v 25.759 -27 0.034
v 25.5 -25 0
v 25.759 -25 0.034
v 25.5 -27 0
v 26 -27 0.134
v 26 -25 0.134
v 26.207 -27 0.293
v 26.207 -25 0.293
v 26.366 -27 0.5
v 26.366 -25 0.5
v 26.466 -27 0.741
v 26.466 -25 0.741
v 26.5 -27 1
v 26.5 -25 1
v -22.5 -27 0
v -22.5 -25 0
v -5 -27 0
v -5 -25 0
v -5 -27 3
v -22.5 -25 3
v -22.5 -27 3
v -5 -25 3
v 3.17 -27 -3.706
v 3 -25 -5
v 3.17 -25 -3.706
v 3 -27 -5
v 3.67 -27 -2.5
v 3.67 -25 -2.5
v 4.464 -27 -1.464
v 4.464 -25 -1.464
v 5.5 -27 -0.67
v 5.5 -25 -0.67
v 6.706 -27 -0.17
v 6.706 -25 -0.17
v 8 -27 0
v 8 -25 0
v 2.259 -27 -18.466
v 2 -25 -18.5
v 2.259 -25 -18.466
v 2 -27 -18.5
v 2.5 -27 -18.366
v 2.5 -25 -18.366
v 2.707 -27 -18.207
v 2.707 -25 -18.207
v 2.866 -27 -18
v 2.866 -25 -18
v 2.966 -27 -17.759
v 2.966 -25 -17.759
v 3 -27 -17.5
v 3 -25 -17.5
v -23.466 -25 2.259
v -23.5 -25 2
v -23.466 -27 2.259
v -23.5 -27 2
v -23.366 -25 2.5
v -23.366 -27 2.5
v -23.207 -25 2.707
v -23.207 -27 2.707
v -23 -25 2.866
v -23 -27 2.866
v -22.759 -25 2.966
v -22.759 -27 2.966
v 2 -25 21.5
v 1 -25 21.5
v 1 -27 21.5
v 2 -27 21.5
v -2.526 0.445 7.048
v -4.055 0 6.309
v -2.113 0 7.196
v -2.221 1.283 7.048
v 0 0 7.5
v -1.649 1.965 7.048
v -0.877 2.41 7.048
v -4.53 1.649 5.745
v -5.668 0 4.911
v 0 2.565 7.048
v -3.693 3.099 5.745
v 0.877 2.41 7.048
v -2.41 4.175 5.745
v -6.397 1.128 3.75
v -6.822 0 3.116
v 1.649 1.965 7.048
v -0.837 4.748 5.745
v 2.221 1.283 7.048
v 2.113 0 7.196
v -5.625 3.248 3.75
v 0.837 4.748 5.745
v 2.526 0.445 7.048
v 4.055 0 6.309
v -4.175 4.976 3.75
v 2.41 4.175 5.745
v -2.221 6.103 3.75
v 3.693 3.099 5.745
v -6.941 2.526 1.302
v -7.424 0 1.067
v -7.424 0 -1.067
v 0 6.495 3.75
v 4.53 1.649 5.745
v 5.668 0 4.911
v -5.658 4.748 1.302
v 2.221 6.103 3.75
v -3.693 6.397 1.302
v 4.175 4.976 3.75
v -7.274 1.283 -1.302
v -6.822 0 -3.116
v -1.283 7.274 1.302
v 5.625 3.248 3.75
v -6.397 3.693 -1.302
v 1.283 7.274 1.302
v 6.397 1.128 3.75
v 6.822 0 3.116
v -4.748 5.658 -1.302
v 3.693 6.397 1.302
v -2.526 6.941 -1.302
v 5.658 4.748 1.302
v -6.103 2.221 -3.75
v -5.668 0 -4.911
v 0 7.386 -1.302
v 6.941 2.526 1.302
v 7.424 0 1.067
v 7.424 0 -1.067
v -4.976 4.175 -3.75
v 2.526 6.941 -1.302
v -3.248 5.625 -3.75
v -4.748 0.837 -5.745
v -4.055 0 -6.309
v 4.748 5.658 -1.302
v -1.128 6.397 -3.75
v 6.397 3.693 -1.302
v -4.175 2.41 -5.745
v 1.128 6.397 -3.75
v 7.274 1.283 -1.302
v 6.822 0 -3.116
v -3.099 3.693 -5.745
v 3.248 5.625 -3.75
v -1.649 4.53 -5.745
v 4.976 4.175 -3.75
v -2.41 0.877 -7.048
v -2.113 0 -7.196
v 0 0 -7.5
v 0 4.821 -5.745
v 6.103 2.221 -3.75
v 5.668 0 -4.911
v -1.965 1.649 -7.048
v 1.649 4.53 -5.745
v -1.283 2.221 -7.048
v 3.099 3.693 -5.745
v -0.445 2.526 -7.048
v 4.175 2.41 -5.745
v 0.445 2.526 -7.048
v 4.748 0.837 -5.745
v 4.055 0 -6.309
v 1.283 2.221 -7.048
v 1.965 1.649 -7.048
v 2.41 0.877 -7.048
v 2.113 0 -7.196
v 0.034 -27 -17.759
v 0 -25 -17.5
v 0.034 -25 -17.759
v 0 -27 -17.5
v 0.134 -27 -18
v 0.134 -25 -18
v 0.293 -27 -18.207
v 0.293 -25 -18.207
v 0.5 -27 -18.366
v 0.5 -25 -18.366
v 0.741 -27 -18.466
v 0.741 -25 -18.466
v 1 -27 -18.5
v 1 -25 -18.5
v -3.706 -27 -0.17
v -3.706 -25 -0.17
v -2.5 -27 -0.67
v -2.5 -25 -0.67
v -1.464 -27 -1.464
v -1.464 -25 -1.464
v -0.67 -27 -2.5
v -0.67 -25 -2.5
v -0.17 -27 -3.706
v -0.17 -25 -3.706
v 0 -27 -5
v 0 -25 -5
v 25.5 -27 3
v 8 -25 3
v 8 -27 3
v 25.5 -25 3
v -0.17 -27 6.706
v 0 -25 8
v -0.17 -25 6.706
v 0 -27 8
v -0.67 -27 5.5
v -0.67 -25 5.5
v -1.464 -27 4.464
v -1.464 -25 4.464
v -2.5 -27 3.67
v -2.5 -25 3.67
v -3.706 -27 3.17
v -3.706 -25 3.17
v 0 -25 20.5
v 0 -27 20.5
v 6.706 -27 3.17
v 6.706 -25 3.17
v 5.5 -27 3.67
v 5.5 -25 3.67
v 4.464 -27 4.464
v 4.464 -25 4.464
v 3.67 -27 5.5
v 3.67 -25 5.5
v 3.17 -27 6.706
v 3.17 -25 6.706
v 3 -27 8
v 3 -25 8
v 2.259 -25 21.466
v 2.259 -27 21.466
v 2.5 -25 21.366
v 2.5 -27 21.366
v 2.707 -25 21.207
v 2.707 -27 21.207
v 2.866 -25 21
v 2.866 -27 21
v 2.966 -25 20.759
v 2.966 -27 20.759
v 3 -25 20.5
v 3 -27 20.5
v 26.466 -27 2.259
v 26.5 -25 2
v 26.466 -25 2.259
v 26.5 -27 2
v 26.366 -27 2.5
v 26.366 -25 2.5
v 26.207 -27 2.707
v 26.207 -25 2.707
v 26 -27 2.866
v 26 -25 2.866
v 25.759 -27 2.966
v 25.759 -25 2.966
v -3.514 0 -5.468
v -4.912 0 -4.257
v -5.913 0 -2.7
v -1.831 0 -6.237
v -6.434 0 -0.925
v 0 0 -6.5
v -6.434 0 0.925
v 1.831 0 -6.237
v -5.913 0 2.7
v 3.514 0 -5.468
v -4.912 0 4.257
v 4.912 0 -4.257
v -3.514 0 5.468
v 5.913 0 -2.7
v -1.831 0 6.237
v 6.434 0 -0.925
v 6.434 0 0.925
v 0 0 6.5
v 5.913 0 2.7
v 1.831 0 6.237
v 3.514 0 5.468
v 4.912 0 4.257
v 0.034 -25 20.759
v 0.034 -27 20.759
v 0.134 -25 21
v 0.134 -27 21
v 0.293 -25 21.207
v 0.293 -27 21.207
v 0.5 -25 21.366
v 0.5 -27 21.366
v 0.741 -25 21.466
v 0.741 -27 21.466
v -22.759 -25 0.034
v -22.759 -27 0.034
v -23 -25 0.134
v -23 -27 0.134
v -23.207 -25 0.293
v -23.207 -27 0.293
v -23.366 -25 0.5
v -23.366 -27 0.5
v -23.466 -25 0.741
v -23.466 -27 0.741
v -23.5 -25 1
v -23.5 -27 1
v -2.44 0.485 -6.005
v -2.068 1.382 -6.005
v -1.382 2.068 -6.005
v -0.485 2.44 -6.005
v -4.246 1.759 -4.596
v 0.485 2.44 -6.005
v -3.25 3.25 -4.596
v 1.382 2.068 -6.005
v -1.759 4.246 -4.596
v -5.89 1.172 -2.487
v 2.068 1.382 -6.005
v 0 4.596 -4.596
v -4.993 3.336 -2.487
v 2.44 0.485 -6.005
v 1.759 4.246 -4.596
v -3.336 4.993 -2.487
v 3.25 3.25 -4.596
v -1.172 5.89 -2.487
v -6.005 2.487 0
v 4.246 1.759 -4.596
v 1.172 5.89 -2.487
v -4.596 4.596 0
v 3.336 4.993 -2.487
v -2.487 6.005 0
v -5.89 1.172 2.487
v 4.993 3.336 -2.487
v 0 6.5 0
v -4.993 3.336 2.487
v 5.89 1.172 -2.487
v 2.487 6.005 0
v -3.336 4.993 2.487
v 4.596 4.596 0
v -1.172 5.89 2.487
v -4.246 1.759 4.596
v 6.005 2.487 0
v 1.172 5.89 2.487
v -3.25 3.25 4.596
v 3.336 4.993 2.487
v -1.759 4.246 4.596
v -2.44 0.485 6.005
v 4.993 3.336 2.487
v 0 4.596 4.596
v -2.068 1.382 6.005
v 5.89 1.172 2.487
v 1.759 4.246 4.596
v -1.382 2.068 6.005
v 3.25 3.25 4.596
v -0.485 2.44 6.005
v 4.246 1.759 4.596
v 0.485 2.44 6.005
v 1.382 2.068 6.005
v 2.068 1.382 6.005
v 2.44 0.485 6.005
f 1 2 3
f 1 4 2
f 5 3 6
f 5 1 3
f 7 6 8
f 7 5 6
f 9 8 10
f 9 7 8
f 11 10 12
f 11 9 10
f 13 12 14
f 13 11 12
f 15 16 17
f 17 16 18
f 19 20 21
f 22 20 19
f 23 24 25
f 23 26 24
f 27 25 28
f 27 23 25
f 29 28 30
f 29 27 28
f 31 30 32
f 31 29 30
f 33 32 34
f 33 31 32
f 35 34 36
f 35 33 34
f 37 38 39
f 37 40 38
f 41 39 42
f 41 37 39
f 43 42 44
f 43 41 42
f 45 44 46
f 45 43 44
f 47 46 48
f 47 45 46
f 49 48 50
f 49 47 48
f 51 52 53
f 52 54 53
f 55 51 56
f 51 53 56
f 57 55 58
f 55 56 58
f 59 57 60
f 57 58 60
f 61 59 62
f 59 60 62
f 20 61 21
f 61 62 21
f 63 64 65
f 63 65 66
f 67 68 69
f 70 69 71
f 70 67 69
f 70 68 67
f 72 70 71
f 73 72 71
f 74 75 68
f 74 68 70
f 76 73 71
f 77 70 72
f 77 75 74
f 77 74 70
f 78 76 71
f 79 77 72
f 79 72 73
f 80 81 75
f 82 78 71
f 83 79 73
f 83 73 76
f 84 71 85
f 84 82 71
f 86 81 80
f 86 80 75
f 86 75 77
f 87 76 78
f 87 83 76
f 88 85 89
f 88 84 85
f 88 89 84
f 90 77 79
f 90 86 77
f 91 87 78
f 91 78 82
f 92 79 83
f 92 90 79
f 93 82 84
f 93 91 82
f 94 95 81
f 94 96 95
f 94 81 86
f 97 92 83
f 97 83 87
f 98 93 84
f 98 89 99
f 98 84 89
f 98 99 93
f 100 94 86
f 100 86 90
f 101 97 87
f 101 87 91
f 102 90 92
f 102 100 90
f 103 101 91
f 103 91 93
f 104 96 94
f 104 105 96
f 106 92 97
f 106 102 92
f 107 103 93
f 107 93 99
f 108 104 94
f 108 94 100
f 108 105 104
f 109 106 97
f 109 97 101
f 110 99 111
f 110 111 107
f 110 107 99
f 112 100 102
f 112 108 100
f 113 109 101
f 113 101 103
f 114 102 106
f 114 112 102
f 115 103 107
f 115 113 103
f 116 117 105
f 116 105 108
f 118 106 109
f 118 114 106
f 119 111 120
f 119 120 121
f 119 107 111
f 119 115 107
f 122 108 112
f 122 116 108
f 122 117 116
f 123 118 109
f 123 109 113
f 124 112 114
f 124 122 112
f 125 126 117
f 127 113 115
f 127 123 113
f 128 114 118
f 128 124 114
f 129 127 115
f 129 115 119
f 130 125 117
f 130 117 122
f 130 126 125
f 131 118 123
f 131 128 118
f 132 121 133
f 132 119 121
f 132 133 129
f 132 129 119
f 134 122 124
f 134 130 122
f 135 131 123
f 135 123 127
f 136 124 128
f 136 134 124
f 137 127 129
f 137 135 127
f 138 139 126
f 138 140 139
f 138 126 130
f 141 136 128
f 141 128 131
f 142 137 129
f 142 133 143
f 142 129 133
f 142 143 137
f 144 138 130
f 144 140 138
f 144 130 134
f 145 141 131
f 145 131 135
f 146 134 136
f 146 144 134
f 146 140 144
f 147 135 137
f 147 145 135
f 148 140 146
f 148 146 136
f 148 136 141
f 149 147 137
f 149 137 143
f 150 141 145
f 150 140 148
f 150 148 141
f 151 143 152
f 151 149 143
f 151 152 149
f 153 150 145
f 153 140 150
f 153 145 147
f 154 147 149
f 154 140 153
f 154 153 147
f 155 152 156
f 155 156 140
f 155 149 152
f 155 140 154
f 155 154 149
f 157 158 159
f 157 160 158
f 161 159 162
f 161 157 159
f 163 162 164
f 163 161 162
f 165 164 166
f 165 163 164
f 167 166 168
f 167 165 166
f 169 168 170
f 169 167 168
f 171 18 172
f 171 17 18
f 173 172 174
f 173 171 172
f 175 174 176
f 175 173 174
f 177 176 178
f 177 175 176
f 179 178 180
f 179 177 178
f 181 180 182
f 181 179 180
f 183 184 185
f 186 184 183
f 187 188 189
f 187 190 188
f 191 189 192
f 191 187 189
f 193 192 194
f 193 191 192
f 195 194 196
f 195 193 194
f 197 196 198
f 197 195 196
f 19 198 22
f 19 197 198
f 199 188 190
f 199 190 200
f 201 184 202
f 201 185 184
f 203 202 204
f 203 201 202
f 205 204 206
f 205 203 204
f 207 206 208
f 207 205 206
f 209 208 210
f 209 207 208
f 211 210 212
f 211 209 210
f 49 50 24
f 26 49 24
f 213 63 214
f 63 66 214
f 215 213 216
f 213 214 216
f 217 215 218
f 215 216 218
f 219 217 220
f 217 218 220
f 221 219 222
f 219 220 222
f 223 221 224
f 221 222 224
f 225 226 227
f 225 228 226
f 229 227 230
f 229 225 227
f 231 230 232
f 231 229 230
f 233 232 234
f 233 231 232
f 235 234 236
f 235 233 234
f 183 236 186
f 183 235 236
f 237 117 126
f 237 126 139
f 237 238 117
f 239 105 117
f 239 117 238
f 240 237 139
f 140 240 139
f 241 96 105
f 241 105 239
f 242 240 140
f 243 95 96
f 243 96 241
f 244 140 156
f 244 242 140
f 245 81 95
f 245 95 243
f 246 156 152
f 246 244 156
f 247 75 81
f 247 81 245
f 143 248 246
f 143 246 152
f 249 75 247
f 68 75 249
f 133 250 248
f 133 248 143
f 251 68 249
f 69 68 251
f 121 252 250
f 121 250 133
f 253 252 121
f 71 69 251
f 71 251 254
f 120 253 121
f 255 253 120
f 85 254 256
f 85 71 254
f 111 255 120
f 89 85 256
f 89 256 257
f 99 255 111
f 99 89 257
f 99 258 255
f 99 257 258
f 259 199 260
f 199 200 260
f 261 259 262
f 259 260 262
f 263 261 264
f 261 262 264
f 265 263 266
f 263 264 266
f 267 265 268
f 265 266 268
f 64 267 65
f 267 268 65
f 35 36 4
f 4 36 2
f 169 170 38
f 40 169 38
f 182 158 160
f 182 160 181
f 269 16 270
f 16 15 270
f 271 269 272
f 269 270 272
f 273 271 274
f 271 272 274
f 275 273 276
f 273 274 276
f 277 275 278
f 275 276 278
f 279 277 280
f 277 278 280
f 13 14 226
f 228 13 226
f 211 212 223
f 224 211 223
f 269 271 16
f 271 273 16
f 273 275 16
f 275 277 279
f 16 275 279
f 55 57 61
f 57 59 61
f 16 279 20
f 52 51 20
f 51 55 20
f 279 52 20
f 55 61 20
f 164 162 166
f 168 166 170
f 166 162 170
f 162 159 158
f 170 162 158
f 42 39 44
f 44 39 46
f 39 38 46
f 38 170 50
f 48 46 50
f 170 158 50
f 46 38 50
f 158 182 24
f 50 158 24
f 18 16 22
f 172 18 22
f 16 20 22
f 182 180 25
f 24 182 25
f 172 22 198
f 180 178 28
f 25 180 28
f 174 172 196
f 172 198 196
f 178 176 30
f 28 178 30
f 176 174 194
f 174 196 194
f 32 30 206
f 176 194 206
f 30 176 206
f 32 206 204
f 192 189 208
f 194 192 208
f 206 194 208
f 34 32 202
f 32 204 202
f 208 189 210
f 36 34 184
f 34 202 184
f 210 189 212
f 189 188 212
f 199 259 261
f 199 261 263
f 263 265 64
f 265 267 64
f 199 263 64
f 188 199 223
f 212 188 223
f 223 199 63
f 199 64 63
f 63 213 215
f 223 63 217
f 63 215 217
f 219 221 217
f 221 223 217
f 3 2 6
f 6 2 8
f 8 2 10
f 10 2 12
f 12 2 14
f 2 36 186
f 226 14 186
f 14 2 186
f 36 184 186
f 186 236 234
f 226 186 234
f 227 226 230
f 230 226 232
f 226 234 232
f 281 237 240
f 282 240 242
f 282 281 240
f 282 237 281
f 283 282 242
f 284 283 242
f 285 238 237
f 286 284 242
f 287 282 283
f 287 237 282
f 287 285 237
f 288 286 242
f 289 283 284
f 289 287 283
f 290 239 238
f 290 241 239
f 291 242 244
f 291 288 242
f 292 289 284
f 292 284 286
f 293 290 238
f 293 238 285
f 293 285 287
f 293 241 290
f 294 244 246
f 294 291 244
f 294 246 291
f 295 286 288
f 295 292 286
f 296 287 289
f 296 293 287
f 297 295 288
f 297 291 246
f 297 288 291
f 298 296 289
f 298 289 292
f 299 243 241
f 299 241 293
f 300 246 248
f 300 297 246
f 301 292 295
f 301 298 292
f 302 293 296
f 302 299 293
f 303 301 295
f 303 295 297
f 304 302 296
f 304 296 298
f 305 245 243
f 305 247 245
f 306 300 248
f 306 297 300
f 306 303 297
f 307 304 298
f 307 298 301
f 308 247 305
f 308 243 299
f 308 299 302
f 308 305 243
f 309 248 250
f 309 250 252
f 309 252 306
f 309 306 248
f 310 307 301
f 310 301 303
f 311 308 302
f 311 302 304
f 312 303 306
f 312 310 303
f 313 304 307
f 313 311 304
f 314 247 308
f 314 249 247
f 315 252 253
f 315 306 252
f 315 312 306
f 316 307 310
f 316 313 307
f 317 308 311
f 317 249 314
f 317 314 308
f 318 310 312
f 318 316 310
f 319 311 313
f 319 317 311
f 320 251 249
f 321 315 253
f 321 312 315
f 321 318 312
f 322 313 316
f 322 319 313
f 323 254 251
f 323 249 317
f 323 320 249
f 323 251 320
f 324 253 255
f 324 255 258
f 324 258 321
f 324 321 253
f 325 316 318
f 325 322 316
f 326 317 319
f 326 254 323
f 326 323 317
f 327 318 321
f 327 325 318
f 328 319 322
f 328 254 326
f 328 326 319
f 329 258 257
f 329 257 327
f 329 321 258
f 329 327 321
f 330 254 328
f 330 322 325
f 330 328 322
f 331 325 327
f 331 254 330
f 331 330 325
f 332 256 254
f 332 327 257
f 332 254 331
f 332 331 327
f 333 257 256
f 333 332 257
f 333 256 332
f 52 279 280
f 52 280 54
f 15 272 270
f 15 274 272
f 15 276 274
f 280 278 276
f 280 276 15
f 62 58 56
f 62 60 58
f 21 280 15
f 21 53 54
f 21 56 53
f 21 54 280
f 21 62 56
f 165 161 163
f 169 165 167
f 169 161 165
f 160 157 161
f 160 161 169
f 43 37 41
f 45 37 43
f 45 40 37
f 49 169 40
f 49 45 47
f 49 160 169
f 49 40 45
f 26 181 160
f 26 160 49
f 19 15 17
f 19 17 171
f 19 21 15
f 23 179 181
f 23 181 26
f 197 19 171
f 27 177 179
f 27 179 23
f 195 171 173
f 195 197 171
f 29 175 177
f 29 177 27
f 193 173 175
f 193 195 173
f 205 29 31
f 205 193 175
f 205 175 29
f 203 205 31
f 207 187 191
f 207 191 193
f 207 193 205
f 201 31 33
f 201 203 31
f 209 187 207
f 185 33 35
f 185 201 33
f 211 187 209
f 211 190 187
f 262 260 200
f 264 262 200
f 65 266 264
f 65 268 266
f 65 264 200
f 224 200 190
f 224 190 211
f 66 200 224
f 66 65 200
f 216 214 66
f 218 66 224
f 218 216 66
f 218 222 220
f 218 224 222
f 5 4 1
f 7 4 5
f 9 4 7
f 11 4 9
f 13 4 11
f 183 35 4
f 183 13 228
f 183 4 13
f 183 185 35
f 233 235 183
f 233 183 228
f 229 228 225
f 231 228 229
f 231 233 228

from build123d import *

# Parameters (mm, degrees)
F1_ANGLE = 180
F4_W     = 23.5
F4_H     = 3
F4_W_2   = 3
F4_H_2   = 18.5
F5_DEPTH = 2
F6_R     = 5
F7_R     = 1


with BuildPart() as f1:
    # F0 (on Front) → F1 (revolve)
    with BuildSketch(Plane.XZ):
        with BuildLine():
            Line((0, 6.5), (0, 7.5))
            ThreePointArc((0, 7.5), (-7.5, 0), (0, -7.5))
            Line((0, -7.5), (0, -6.5))
            ThreePointArc((0, -6.5), (-6.5, 0), (0, 6.5))
        make_face()
    revolve(axis=Axis((0, 0, -1.1614337564), (0, 0, -1)), revolution_arc=F1_ANGLE)


with BuildPart() as f5:
    # F4 (on offset) → F5 (new body)
    with BuildSketch(Plane.XZ.offset(25)):
        with Locations((-11.75, 1.5)):
            Rectangle(F4_W, F4_H)
        with Locations((14.75, 1.5)):
            Rectangle(F4_W, F4_H)
        with Locations((1.5, -9.25)):
            Rectangle(F4_W_2, F4_H_2)
        with Locations((1.5, 12.25)):
            Rectangle(F4_W_2, F4_H_2)
        with Locations((1.5, 1.5)):
            Rectangle(F4_W_2, F4_H)
    extrude(amount=F5_DEPTH)

    # F6
    f6_edges = [f5.edges().sort_by_distance(p)[0] for p in [
        (0, -26, 3),
        (0, -26, 0),
        (3, -26, 0),
        (3, -26, 3),
    ]]
    fillet(f6_edges, radius=F6_R)

    # F7
    f7_edges = [f5.edges().sort_by_distance(p)[0] for p in [
        (3, -26, 21.5),
        (0, -26, 21.5),
        (26.5, -26, 3),
        (26.5, -26, 0),
        (3, -26, -18.5),
        (0, -26, -18.5),
        (-23.5, -26, 3),
        (-23.5, -26, 0),
    ]]
    fillet(f7_edges, radius=F7_R)


solid = Compound([f1.part, f5.part])
